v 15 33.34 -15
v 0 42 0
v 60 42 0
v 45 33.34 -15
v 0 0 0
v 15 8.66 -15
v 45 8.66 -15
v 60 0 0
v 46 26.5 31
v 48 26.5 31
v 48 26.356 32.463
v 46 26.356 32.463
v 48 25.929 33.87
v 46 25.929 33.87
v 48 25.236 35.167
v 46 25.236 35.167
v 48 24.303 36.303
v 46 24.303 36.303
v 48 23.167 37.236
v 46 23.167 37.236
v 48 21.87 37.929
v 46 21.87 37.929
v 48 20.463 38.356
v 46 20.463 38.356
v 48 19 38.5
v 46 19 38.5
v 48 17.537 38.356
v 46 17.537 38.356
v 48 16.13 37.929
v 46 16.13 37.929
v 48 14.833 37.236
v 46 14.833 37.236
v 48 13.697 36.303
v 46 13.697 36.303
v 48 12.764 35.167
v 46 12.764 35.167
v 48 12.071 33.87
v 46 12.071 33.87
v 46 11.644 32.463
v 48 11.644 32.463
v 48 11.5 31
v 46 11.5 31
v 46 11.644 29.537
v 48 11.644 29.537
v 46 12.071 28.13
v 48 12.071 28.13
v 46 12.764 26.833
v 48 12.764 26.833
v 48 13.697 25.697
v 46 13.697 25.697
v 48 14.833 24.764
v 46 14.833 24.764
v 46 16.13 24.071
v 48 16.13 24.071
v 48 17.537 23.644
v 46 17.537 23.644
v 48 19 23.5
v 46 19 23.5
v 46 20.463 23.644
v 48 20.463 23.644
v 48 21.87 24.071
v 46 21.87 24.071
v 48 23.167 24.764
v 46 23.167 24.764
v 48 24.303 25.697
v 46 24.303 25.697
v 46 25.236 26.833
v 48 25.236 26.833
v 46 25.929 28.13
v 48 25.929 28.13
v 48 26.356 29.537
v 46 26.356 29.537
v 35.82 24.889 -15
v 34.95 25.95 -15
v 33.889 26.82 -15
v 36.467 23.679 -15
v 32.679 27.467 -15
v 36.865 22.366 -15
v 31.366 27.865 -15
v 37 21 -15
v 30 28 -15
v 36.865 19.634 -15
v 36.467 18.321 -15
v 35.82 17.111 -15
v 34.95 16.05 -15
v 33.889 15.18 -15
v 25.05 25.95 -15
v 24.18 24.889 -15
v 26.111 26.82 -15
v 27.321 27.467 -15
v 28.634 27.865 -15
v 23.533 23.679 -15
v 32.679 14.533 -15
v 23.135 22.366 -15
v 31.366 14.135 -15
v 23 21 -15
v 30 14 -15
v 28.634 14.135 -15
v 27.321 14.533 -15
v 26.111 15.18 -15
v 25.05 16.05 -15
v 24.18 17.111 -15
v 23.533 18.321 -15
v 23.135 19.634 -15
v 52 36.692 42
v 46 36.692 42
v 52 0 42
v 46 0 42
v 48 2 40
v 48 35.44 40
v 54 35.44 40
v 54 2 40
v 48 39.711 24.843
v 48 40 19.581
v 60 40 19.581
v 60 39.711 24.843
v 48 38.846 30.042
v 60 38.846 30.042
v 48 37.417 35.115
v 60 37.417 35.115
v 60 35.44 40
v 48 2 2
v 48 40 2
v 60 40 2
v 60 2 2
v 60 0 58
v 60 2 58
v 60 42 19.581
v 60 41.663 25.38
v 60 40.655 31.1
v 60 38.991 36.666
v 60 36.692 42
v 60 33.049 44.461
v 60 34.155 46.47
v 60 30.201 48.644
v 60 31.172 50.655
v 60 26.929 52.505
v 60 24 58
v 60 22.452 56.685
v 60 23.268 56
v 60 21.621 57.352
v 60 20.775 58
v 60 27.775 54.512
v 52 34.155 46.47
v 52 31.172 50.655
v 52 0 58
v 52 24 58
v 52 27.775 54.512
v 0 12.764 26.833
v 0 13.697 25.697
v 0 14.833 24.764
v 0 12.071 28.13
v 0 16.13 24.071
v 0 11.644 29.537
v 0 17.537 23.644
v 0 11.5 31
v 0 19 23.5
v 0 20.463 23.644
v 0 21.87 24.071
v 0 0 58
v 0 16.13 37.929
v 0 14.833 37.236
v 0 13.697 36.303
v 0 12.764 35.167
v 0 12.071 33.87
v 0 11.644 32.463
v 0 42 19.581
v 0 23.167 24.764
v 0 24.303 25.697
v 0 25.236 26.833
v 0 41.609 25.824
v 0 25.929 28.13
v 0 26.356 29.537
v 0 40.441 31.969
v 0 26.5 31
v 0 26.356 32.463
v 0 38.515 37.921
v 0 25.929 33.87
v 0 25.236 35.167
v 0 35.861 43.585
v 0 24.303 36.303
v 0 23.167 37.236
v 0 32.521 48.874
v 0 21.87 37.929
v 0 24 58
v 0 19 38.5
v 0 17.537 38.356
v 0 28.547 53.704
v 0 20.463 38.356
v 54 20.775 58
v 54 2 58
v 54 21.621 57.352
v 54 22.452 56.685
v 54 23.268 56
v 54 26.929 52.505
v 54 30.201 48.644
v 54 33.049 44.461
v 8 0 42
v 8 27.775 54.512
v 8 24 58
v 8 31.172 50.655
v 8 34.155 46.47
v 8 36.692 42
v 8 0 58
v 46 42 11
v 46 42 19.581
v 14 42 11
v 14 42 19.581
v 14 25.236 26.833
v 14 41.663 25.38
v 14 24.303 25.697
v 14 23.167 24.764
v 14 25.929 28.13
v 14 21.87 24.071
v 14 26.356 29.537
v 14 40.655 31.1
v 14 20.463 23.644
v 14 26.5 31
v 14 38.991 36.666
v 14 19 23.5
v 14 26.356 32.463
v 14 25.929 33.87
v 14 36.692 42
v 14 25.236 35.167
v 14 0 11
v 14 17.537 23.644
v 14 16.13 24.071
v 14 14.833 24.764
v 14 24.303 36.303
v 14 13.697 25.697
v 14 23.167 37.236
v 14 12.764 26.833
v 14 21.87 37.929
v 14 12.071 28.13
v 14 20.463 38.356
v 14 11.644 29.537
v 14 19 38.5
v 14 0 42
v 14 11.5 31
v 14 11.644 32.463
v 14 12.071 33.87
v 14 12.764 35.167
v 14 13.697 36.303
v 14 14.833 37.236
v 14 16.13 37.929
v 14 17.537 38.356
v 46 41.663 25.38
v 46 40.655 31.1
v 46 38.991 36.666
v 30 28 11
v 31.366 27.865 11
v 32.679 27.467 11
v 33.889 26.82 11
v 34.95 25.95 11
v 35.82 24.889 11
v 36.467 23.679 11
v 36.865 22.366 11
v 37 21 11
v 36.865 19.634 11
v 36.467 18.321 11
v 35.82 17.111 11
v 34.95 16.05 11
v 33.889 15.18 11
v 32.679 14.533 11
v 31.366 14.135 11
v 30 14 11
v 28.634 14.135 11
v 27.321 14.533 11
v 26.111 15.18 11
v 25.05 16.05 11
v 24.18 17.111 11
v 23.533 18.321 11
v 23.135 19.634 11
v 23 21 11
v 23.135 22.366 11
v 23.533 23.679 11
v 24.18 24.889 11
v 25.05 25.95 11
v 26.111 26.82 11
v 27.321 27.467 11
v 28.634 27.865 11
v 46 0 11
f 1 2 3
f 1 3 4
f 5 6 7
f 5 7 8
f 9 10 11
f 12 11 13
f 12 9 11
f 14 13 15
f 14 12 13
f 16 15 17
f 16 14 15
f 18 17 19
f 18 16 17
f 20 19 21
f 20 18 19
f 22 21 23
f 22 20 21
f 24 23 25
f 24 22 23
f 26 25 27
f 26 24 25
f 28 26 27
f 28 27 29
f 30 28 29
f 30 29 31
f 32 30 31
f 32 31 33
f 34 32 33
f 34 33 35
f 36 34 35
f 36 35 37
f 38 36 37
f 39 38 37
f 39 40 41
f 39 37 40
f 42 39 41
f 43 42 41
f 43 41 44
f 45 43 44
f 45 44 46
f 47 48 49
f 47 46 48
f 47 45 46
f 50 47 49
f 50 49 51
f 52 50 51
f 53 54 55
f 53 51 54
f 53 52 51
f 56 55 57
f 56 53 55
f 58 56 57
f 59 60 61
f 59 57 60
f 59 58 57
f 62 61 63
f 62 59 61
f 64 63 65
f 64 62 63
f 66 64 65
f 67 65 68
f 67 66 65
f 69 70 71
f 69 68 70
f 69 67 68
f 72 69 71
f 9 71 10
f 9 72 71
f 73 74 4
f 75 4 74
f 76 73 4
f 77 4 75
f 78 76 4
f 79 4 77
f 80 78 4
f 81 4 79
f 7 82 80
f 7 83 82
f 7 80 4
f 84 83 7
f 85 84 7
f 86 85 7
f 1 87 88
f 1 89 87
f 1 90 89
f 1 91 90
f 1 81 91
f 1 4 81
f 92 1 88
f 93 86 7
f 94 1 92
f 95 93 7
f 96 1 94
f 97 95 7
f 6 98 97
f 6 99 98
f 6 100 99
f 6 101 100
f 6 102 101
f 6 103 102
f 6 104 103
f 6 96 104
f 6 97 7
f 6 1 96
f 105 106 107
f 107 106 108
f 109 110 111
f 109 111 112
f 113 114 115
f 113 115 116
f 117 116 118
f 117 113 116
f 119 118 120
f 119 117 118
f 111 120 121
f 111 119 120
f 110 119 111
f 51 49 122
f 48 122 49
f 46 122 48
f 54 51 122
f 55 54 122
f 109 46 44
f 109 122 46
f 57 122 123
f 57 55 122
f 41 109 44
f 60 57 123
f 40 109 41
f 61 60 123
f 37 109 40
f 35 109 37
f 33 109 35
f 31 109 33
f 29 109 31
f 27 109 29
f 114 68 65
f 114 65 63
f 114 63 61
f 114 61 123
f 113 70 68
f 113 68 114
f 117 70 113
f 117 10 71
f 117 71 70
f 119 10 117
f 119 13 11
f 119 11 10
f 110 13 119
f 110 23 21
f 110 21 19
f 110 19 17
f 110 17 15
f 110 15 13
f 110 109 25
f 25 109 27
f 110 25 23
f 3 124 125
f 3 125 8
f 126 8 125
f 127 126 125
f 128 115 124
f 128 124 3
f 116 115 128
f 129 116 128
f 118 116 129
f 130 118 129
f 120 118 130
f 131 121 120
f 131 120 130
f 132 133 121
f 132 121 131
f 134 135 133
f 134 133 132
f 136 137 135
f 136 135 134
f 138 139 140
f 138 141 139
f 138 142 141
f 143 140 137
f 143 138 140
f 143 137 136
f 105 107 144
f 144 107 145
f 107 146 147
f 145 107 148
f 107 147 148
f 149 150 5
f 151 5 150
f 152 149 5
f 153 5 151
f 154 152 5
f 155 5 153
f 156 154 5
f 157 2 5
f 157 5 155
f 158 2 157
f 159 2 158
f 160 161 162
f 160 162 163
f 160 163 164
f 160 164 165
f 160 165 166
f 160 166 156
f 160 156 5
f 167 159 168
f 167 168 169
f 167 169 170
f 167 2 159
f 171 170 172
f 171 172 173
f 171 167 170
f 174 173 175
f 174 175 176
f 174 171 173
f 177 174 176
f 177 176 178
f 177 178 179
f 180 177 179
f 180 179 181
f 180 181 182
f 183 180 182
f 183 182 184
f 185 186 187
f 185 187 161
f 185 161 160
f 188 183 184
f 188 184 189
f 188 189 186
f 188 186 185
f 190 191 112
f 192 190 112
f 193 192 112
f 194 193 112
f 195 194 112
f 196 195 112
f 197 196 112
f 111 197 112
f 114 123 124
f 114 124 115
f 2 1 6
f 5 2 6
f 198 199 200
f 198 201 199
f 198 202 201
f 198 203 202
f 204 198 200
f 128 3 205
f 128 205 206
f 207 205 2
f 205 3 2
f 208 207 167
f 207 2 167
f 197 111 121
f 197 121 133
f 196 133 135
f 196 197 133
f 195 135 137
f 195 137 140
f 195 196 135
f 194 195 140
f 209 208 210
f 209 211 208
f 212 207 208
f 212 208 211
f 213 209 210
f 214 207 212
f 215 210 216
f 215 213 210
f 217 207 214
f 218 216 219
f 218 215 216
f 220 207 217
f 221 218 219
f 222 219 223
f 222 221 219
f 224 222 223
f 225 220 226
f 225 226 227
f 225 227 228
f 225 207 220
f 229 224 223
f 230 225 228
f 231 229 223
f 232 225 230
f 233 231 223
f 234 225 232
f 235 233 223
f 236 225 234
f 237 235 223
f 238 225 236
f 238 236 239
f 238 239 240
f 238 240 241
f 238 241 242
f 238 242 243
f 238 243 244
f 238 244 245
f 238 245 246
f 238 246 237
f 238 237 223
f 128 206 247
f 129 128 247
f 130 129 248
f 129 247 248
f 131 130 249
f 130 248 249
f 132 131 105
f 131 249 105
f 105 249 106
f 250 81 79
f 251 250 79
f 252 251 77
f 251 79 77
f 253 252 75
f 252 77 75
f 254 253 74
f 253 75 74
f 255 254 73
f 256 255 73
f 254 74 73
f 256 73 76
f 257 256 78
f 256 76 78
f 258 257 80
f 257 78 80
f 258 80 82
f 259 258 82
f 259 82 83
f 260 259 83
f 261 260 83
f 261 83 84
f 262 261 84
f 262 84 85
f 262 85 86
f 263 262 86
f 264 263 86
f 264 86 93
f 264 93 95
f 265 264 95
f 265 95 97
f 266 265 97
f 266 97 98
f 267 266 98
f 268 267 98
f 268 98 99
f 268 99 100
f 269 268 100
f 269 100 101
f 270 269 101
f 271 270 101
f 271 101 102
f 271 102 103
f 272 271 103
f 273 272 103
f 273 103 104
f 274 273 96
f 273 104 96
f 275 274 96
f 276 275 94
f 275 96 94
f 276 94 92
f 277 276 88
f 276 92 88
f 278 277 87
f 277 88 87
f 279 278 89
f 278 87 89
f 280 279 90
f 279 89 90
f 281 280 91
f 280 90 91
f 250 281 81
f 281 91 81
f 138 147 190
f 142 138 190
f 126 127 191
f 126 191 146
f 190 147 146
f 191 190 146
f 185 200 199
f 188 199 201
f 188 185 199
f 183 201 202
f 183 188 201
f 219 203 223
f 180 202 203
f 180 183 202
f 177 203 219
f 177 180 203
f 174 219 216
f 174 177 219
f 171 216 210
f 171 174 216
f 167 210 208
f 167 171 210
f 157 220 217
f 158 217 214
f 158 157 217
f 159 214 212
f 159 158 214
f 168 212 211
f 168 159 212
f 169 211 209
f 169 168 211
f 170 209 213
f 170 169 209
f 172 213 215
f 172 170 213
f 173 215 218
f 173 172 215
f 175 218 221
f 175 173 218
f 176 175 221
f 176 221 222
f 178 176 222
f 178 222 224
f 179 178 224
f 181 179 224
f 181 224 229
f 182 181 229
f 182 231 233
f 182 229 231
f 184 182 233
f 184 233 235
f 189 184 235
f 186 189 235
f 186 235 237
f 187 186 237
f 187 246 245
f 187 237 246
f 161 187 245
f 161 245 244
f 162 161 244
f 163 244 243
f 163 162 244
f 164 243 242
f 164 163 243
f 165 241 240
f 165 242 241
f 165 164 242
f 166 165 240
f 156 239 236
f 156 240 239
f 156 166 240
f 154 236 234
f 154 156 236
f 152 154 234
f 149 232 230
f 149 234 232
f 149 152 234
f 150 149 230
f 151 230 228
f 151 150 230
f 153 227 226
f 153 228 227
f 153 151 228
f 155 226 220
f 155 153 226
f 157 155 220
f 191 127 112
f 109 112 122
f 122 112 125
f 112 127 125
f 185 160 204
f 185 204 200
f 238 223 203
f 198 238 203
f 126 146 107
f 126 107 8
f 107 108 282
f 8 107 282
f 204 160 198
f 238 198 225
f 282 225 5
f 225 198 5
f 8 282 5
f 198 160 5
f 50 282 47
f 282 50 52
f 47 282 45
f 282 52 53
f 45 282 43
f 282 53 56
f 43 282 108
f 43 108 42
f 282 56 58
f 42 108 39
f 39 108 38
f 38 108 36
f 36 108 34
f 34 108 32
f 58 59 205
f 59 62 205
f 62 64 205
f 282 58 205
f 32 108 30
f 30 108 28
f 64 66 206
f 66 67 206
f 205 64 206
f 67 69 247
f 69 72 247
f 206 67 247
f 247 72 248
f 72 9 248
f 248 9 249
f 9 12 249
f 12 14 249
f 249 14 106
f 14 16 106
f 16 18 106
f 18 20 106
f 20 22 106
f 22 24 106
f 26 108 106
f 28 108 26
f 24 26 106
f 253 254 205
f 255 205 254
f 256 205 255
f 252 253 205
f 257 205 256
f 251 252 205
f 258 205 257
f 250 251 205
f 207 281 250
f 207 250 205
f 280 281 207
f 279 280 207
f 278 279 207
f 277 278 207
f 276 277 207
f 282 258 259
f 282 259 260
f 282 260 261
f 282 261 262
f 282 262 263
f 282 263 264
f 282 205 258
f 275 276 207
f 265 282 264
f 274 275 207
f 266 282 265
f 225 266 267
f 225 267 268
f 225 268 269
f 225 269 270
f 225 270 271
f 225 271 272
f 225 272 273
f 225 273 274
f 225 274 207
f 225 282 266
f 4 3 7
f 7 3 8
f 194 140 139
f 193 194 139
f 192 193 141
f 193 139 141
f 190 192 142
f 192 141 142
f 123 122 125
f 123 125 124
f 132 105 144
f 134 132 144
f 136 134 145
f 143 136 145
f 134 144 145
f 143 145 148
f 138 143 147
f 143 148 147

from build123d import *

# Parameters (mm, degrees)
SKETCH1_R           = 7.5
BOSS_EXTRUDE1_DEPTH = 60
CUT_EXTRUDE2_DEPTH  = 60
SKETCH3_R           = 7
CUT_EXTRUDE3_DEPTH  = 104.406963015
CHAMFER1_SIZE       = 15
SPLIT2_START        = 46
SPLIT2_OUTLINE_R    = 7.5
SPLIT2_DEPTH        = 14
SPLIT2_START_2      = 52
SPLIT2_2_DEPTH      = 8
SPLIT2_3_DEPTH      = 58
SHELL1_START        = 48
SHELL1_DEPTH        = 12
SHELL1_START_2      = 54
SHELL1_2_DEPTH      = 6
CUT_EXTRUDE4_DEPTH  = 12
CUT_EXTRUDE5_DEPTH  = 6
CUT_EXTRUDE6_DEPTH  = 6


# Read off the part's stored shape, not the designer's step: Split2, Shell1
with BuildPart() as part:
    # Sketch1 → Boss-Extrude1 (new body)
    with BuildSketch(Plane(origin=(0, 0, 0), x_dir=(0, 0, -1), z_dir=(1, 0, 0))):
        with BuildLine():
            Line((-58, 0), (-58, 24))
            ThreePointArc((-58, 24), (-40.794458011, 37.276925691), (-19.581254575, 42))
            Line((-19.581254575, 42), (0, 42))
            Line((0, 42), (15, 33.339745962))
            Line((15, 33.339745962), (15, 8.660254038))
            Line((15, 8.660254038), (0, 0))
            Line((0, 0), (-58, 0))
        make_face()
        with Locations((-31, 19)):
            Circle(SKETCH1_R, mode=Mode.SUBTRACT)
    extrude(amount=BOSS_EXTRUDE1_DEPTH)

    # Sketch2 → Cut-Extrude2 (cut)
    with BuildSketch(Plane(origin=(0, 0, 0), x_dir=(1, 0, 0), z_dir=(0, 1, 0))):
        Polygon((8, -58), (30, -58), (30, -11), (14, -11), (14, -42), (8, -42), align=None)
        Polygon((30, -11), (30, -58), (52, -58), (52, -42), (46, -42), (46, -11), align=None)
    extrude(amount=CUT_EXTRUDE2_DEPTH, mode=Mode.SUBTRACT)

    # Sketch3 → Cut-Extrude3 (cut, through all)
    with BuildSketch(Plane(origin=(0, 0, -15), x_dir=(-1, 0, 0), z_dir=(0, 0, -1))):
        with Locations(Location((-30, 21, 0), (0, 0, 90))):
            Circle(SKETCH3_R)
    extrude(amount=-CUT_EXTRUDE3_DEPTH, mode=Mode.SUBTRACT)

    # Chamfer1
    chamfer1_edges = [part.edges().sort_by_distance(p)[0] for p in [
        (0, 21, -15),
        (60, 21, -15),
    ]]
    chamfer(chamfer1_edges, length=CHAMFER1_SIZE)

    # Split2 3 outline → Split2 3 (cut)
    with BuildSketch(Plane.XY):
        Polygon((60, 42), (46, 42), (46, 0), (52, 0), (60, 0), align=None)
    extrude(amount=SPLIT2_3_DEPTH, mode=Mode.SUBTRACT)


with BuildPart() as body_2:
    # Split2 outline → Split2 (new body)
    with BuildSketch(Plane.YZ.offset(SPLIT2_START)):
        with BuildLine():
            Line((0, 42), (0, 0))
            Line((0, 0), (42, 0))
            Line((42, 0), (42, 19.581254575))
            ThreePointArc((42, 19.581254575), (40.654979081, 31.100499804), (36.692279575, 42))
            Line((36.692279575, 42), (0, 42))
        make_face()
        with Locations((19, 31)):
            Circle(SPLIT2_OUTLINE_R, mode=Mode.SUBTRACT)
    extrude(amount=SPLIT2_DEPTH)

    # Split2 2 outline → Split2 2 (add)
    with BuildSketch(Plane.YZ.offset(SPLIT2_START_2)):
        with BuildLine():
            Line((0, 58), (0, 42))
            Line((0, 42), (36.692279575, 42))
            ThreePointArc((36.692279575, 42), (31.171755598, 50.654934168), (24, 58))
            Line((24, 58), (0, 58))
        make_face()
    extrude(amount=SPLIT2_2_DEPTH)

    # Shell1 outline → Shell1 (cut)
    with BuildSketch(Plane.YZ.offset(SHELL1_START)):
        with BuildLine():
            ThreePointArc((40, 19.581254575), (38.846252688, 30.042067598), (35.440474621, 40))
            Line((35.440474621, 40), (22.041381265, 40))
            ThreePointArc((22.041381265, 40), (19, 21.5), (15.958618735, 40))
            Line((15.958618735, 40), (2, 40))
            Line((2, 40), (2, 2))
            Line((2, 2), (40, 2))
            Line((40, 2), (40, 19.581254575))
        make_face()
    extrude(amount=SHELL1_DEPTH, mode=Mode.SUBTRACT)

    # Shell1 2 outline → Shell1 2 (cut)
    with BuildSketch(Plane.YZ.offset(SHELL1_START_2)):
        with BuildLine():
            Line((22.041381265, 40), (35.440474621, 40))
            ThreePointArc((35.440474621, 40), (30.201195976, 48.644437917), (23.267794641, 56))
            Line((23.267794641, 56), (2, 56))
            Line((2, 56), (2, 40))
            Line((2, 40), (15.958618735, 40))
            ThreePointArc((15.958618735, 40), (19, 40.5), (22.041381265, 40))
        make_face()
    extrude(amount=SHELL1_2_DEPTH, mode=Mode.SUBTRACT)

    # Sketch4 → Cut-Extrude4 (cut)
    with BuildSketch(Plane(origin=(48, 0, 0), x_dir=(0, 0, -1), z_dir=(1, 0, 0))):
        with BuildLine():
            Line((-40, 15.958618735), (-40, 22.041381265))
            ThreePointArc((-40, 22.041381265), (-21.5, 19), (-40, 15.958618735))
        make_face()
    extrude(amount=CUT_EXTRUDE4_DEPTH, mode=Mode.SUBTRACT)

    # Sketch5 → Cut-Extrude5 (cut)
    with BuildSketch(Plane(origin=(54, 0, 0), x_dir=(0, 0, -1), z_dir=(1, 0, 0))):
        Polygon((-40, 14.184038534), (-40, 24.39394248), (-43.350764403, 21.043178076), align=None)
    extrude(amount=CUT_EXTRUDE5_DEPTH, mode=Mode.SUBTRACT)

    # Sketch6 → Cut-Extrude6 (cut)
    with BuildSketch(Plane(origin=(60, 0, 0), x_dir=(0, 0, -1), z_dir=(1, 0, 0))):
        with BuildLine():
            ThreePointArc((-56, 23.267794641), (-57.020752822, 22.038042064), (-58, 20.77498914))
            Line((-58, 20.77498914), (-58, 2))
            Line((-58, 2), (-56, 2))
            Line((-56, 2), (-56, 23.267794641))
        make_face()
    extrude(amount=-CUT_EXTRUDE6_DEPTH, mode=Mode.SUBTRACT)


with BuildPart() as part_1:
    add(part.part)

    # Combine1: union body 2
    add(body_2.part)


solid = part_1.part
